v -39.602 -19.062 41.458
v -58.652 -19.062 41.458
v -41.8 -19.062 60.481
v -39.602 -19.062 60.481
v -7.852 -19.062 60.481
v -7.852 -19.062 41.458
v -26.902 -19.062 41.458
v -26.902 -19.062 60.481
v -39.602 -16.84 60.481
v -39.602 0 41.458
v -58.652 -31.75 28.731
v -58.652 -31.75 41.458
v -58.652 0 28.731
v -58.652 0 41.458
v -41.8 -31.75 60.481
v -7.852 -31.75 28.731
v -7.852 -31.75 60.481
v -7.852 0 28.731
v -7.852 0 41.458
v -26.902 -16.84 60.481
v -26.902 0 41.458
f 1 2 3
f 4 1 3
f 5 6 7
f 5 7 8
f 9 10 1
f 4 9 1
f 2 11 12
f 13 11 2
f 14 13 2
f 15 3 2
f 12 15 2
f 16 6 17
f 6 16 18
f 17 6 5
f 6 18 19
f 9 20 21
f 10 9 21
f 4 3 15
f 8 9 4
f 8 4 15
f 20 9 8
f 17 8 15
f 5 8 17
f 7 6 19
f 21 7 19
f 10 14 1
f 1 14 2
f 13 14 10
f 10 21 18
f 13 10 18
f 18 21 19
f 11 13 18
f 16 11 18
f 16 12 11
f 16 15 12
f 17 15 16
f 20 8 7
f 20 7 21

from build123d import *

# Parameters (mm, degrees)
F0_W     = 50.8
F0_H     = 31.75
F1_DEPTH = 31.75
F2_W     = 19.062214
F2_H     = 19.023106
F3_DEPTH = 19.05
F4_W     = 19.062212
F4_H     = 19.023106
F5_DEPTH = 19.05
F7_DEPTH = 25.4
F9_DEPTH = 25.4


with BuildPart() as f1:
    # F0 (on Front) → F1 (new body)
    with BuildSketch(Plane.XZ):
        with Locations((-33.25202, 44.606277)):
            Rectangle(F0_W, F0_H)
    extrude(amount=F1_DEPTH)

    # F2 (on face) → F3 (cut)
    with BuildSketch(Plane(origin=(-58.65202, 0, 0), x_dir=(0, -1, 0), z_dir=(-1, 0, 0))):
        with Locations((9.531107, 50.969724)):
            Rectangle(F2_W, F2_H)
    extrude(amount=-F3_DEPTH, mode=Mode.SUBTRACT)

    # F4 (on face) → F5 (cut)
    with BuildSketch(Plane.YZ.offset(-7.85202)):
        with Locations((-9.531106, 50.969724)):
            Rectangle(F4_W, F4_H)
    extrude(amount=-F5_DEPTH, mode=Mode.SUBTRACT)

    # F6 (on face) → F7 (cut)
    with BuildSketch(Plane(origin=(0, -19.062214, 0), x_dir=(-1, 0, 0), z_dir=(0, 1, 0))):
        Polygon((41.800097, 60.481277), (58.65202, 41.458171), (58.65202, 60.481277), align=None)
    extrude(amount=-F7_DEPTH, mode=Mode.SUBTRACT)

    # F8 (on face) → F9 (cut)
    with BuildSketch(Plane.YZ.offset(-26.90202)):
        Polygon((-16.839711, 60.481277), (0, 41.458171), (0, 60.481277), align=None)
    extrude(amount=-F9_DEPTH, mode=Mode.SUBTRACT)


solid = f1.part
